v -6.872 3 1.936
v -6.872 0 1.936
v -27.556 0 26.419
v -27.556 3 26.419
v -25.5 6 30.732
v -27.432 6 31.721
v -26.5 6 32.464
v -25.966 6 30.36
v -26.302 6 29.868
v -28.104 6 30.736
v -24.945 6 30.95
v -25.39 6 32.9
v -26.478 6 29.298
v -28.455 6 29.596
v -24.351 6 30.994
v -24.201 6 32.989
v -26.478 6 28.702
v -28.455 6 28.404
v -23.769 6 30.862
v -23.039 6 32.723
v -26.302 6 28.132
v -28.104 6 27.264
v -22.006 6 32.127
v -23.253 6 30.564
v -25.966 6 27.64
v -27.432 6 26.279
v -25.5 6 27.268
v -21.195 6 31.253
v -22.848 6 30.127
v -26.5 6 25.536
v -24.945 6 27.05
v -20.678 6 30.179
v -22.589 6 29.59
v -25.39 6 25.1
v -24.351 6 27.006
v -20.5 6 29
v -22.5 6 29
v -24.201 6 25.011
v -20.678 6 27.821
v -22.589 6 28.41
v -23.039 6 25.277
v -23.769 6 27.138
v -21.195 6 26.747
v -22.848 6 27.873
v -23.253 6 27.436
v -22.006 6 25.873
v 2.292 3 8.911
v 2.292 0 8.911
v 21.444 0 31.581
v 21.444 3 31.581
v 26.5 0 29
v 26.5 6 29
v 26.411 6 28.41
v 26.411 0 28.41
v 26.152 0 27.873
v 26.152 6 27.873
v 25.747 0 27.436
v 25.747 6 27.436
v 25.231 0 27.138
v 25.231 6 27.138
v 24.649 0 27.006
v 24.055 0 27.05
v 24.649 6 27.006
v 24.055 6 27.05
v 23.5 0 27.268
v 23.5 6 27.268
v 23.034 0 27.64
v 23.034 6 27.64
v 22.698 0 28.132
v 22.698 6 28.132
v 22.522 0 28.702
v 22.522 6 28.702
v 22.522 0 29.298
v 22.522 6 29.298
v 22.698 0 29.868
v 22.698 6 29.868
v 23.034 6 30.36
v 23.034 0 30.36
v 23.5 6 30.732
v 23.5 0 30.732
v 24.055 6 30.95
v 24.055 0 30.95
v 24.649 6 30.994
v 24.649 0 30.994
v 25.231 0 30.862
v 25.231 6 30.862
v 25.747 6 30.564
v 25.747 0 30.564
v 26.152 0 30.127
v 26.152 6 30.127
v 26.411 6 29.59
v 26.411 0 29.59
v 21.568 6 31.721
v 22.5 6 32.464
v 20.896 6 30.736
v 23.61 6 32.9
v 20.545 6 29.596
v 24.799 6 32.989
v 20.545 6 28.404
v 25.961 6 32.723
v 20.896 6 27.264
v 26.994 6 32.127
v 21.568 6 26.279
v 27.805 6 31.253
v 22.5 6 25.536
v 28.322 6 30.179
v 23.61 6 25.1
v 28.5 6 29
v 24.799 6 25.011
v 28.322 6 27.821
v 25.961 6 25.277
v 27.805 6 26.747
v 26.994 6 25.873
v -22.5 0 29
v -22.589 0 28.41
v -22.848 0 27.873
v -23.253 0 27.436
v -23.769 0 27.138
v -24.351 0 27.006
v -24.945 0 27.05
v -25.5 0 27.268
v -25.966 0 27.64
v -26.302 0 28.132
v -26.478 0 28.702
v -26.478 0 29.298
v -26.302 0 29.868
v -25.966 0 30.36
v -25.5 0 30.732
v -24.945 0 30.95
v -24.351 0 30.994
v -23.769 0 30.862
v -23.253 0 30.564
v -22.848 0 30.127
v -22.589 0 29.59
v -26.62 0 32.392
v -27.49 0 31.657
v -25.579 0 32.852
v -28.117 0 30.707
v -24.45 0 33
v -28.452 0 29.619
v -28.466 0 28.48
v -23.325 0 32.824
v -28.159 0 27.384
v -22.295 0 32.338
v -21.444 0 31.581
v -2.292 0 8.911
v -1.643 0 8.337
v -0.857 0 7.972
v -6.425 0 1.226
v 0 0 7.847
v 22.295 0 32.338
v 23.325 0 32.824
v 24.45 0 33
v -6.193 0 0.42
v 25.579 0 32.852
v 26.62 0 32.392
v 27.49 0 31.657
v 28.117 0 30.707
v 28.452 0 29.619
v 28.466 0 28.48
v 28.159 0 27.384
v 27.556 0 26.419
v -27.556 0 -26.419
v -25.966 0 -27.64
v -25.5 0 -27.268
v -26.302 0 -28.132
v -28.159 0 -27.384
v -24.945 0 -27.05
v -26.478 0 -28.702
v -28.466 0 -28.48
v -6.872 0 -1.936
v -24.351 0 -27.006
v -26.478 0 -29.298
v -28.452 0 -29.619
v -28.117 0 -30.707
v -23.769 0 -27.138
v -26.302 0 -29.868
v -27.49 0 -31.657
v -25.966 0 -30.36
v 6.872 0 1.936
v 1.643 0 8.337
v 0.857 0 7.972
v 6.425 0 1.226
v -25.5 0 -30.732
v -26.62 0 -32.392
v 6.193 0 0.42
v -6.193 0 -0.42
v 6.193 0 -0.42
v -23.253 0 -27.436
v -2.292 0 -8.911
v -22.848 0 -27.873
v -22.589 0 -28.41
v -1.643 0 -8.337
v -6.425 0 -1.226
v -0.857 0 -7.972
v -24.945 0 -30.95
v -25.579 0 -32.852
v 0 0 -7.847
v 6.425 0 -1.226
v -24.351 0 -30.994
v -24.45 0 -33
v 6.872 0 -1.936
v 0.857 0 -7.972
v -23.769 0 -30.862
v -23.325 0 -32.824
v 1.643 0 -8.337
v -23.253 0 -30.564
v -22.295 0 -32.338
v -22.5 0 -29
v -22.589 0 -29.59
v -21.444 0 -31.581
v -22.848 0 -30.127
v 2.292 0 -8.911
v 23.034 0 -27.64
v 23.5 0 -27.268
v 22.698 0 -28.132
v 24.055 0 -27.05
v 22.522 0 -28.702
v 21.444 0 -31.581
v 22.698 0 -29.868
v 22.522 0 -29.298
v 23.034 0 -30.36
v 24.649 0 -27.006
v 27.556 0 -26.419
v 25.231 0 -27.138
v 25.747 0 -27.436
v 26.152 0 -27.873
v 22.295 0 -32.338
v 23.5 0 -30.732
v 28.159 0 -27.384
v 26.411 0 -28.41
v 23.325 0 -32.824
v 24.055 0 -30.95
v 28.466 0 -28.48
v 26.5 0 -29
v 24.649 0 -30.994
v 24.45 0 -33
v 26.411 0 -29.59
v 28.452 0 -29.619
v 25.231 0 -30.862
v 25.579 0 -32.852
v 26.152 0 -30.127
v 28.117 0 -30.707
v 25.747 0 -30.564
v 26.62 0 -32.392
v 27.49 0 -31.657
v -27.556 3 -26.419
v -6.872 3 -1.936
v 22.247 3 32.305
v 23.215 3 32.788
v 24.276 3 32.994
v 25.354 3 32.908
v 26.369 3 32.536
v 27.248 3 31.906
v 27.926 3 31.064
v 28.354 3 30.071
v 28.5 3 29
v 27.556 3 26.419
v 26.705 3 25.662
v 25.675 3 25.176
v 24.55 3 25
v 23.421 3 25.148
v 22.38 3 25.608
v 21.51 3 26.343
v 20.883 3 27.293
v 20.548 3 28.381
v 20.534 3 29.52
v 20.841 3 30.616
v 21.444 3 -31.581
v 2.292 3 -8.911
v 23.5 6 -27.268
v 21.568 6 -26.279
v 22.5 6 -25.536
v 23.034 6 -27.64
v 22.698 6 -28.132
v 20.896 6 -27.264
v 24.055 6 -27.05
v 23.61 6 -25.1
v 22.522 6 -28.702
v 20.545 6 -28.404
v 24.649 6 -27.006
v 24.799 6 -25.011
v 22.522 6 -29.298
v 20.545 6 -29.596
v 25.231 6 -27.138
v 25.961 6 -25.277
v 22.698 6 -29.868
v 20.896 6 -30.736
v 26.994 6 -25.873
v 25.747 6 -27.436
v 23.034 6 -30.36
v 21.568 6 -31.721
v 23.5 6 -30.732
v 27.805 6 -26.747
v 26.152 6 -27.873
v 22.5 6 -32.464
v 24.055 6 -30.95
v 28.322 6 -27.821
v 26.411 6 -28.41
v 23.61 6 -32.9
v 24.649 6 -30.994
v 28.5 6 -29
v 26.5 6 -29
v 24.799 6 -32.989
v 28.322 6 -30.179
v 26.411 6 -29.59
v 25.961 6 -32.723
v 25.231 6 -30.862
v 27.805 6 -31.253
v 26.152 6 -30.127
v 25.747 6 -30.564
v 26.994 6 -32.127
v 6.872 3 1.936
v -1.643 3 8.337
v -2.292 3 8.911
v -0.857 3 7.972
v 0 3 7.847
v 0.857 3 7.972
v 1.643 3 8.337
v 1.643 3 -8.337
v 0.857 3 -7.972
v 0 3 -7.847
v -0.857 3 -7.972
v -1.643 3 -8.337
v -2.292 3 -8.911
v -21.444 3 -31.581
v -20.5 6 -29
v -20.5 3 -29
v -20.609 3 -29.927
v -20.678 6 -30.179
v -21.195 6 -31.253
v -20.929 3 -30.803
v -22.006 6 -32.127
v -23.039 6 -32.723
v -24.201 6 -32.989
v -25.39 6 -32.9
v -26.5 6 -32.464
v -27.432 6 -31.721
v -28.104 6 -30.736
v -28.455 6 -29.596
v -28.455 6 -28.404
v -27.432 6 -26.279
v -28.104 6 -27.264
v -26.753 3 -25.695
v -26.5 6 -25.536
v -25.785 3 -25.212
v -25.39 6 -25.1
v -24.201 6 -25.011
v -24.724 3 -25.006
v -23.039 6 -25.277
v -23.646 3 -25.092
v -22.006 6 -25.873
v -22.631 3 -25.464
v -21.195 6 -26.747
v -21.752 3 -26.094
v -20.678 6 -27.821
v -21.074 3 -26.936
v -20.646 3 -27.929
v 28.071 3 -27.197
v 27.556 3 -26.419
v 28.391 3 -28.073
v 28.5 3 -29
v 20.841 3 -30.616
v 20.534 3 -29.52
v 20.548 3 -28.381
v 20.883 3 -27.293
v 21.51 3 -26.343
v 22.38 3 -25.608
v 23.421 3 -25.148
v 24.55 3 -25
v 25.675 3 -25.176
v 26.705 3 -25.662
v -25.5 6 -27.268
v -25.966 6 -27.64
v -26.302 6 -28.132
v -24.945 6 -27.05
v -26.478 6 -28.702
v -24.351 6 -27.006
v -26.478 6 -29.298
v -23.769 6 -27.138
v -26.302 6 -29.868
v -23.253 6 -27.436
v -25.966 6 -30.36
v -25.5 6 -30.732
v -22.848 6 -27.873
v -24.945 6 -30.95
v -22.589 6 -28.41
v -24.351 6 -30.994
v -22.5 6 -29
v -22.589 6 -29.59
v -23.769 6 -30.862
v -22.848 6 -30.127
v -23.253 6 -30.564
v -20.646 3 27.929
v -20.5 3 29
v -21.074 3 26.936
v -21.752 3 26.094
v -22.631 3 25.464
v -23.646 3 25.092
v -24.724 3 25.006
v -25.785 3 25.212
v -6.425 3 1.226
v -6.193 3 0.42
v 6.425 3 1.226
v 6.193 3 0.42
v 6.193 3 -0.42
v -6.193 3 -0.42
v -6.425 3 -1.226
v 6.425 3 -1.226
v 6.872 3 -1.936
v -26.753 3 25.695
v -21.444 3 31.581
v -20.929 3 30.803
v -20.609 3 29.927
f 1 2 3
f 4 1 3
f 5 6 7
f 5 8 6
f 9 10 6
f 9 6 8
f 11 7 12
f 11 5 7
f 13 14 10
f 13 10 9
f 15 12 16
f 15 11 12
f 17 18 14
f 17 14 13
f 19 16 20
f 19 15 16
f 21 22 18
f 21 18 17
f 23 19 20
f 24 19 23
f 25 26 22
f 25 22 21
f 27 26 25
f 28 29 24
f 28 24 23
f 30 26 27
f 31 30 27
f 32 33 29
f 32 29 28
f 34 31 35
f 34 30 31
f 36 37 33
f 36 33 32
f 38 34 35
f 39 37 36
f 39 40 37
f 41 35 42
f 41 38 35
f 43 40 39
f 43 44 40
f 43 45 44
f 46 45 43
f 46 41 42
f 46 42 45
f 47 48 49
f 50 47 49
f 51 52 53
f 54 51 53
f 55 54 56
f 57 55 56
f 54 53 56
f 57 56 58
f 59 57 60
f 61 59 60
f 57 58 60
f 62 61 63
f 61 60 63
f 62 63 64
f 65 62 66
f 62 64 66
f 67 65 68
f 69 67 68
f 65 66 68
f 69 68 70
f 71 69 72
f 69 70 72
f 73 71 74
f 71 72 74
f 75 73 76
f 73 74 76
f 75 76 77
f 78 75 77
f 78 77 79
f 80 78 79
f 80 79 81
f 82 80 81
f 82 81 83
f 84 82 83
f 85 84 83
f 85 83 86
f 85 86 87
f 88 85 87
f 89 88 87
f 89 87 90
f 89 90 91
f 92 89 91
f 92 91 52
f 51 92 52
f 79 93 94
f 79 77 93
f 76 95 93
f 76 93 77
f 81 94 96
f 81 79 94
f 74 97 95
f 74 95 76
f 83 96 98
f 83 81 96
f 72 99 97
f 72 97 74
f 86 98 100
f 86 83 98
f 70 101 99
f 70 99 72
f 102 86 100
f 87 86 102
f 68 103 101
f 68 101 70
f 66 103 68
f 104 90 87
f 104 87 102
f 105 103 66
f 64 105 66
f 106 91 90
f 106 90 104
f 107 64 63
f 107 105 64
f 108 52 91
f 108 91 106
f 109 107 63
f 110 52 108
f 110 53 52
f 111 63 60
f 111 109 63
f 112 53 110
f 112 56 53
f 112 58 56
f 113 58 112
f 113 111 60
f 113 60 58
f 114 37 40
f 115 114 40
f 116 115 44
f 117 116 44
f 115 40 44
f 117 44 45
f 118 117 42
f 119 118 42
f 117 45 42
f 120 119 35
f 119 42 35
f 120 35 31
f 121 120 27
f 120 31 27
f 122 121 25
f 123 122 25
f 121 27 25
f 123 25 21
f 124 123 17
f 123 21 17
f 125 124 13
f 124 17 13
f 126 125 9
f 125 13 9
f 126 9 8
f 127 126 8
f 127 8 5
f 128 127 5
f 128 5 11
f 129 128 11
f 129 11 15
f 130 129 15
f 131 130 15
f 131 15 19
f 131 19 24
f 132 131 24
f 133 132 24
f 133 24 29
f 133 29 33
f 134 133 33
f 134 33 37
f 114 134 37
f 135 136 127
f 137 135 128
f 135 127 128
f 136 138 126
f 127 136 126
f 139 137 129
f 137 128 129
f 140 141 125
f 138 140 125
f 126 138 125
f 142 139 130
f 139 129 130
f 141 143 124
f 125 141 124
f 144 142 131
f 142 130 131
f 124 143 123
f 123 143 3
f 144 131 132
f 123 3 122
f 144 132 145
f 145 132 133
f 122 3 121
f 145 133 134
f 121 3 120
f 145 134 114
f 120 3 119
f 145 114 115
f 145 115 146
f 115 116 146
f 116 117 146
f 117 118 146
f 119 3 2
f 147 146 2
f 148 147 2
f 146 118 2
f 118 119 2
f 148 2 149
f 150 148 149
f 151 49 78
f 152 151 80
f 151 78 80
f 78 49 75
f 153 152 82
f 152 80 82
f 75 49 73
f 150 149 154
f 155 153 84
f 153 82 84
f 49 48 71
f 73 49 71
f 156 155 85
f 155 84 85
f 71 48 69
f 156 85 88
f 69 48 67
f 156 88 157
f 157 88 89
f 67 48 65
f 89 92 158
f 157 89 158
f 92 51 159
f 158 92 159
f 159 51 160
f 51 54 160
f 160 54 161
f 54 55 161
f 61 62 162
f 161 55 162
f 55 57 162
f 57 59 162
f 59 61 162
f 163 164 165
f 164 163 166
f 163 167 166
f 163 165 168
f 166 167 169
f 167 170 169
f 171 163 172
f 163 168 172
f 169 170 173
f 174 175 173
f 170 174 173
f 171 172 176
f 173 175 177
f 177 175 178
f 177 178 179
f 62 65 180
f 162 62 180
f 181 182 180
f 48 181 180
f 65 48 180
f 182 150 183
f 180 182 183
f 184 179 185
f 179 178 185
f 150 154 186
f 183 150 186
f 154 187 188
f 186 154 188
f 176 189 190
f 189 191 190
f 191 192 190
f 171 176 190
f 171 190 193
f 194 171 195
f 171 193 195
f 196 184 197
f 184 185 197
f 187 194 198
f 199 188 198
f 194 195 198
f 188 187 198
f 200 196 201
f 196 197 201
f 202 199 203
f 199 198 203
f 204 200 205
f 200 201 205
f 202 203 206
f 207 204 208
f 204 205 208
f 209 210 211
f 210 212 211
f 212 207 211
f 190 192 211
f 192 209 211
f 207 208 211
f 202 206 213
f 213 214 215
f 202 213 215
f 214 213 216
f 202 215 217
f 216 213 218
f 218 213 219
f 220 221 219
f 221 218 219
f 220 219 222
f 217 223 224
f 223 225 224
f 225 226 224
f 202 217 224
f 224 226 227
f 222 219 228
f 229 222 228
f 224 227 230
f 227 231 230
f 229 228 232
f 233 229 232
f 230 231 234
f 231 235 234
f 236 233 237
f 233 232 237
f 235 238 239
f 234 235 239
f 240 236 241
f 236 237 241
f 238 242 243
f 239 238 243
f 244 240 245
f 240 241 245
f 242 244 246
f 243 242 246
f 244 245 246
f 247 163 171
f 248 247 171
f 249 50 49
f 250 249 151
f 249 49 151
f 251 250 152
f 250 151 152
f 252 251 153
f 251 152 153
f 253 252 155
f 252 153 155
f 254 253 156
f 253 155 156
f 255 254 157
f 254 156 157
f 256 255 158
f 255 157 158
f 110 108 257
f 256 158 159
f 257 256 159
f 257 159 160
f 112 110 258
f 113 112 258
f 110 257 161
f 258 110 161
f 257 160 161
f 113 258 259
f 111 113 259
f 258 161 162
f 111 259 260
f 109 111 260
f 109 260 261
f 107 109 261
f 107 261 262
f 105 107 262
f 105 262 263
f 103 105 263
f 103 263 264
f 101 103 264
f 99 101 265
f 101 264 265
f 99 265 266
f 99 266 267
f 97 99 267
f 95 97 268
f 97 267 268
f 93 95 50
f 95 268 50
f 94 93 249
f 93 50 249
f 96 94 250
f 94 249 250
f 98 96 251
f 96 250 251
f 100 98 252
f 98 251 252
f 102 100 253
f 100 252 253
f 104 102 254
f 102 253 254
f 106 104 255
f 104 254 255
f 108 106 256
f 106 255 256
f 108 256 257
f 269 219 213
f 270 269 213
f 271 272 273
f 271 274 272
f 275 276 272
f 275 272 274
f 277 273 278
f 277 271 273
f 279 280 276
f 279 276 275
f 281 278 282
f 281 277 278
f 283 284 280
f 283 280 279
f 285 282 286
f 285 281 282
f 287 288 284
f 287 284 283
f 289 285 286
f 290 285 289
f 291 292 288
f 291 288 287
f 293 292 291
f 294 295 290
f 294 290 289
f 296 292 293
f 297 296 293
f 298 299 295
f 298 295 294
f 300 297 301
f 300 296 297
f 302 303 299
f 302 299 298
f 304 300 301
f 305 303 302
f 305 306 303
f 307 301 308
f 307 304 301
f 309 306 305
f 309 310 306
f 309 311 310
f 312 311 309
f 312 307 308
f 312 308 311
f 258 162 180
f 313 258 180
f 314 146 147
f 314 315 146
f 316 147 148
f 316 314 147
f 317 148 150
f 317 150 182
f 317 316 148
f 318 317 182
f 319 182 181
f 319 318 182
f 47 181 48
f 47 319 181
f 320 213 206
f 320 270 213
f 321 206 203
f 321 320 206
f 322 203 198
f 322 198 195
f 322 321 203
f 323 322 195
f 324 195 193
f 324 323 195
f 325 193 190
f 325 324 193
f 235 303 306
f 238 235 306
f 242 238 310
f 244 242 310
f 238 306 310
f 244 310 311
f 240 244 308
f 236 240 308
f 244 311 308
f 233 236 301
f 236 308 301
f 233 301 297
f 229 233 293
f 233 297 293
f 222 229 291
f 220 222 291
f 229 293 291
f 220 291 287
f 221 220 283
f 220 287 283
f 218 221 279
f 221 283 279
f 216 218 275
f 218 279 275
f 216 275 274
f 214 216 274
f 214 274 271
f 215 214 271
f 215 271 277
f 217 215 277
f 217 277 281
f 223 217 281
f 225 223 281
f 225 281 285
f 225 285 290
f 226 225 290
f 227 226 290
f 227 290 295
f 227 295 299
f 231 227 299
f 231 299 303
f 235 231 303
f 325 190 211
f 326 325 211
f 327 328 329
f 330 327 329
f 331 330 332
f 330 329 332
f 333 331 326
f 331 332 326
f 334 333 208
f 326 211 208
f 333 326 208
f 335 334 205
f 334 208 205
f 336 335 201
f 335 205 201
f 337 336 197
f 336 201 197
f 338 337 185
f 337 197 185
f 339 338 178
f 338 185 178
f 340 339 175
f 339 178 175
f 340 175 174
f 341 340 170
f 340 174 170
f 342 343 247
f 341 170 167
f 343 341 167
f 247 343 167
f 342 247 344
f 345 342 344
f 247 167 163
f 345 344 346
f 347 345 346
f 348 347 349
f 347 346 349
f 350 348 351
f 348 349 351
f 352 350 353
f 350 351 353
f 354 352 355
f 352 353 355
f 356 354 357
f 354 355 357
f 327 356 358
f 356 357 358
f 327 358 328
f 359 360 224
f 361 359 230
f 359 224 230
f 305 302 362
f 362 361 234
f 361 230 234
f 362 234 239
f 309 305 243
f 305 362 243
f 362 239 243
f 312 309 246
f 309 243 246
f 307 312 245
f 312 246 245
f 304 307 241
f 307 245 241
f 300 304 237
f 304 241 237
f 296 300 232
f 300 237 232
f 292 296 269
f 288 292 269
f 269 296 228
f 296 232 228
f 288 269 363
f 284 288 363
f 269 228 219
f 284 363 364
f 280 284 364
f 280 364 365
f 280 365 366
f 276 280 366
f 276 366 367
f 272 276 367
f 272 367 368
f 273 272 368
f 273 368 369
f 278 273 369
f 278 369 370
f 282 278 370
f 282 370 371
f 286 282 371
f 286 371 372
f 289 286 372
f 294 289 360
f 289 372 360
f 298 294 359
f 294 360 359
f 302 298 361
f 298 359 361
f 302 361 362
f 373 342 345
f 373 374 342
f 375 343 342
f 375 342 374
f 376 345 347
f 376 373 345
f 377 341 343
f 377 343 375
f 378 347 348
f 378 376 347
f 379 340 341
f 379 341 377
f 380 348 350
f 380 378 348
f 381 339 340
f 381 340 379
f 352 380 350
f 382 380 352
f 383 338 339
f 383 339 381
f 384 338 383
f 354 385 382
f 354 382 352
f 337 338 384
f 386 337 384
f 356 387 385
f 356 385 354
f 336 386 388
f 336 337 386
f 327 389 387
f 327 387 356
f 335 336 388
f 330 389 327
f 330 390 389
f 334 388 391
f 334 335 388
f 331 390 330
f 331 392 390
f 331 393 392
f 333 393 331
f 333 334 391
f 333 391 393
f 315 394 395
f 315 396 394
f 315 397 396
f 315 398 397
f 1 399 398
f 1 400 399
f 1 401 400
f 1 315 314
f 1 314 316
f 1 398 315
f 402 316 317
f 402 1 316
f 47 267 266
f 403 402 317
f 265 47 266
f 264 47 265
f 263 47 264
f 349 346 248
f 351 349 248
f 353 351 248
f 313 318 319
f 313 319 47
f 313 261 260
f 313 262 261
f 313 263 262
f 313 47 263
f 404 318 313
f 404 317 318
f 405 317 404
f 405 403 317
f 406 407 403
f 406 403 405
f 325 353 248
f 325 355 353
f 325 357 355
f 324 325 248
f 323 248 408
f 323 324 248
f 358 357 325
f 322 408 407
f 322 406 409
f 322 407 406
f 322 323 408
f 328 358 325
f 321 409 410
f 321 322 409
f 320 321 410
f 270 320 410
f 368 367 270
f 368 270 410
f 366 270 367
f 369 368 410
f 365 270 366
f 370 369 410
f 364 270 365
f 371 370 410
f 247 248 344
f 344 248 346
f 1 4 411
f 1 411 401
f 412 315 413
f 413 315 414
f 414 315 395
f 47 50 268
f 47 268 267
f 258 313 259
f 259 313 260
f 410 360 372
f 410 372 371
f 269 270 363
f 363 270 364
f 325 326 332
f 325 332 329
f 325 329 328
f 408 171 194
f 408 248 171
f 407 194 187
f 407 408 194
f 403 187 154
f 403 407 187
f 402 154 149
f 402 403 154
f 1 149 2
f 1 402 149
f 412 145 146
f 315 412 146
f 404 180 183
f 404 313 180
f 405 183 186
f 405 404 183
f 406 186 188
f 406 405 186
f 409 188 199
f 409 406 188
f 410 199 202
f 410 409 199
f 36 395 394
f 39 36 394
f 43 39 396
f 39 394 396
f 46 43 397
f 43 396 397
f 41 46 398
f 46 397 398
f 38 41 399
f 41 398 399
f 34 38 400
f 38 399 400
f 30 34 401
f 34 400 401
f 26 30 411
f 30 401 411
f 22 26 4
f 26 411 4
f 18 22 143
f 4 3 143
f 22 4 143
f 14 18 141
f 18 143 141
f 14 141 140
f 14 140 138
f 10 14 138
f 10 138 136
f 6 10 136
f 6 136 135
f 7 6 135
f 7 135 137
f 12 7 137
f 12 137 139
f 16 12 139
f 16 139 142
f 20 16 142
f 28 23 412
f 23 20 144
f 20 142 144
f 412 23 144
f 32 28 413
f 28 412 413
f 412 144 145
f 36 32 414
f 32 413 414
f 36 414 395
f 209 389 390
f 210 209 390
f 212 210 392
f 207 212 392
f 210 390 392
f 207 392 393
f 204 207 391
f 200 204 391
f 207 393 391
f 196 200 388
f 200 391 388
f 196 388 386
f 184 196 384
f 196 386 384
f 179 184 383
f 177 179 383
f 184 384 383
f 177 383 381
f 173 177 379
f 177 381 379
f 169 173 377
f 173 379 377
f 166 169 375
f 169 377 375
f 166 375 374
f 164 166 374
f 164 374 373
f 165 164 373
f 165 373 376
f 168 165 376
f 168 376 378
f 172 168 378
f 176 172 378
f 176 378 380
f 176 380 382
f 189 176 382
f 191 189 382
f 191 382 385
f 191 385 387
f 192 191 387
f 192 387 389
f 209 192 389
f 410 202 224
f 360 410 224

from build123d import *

# Parameters (mm, degrees)
BOSS_EXTRUDE3_DEPTH = 3
FILLET2_R           = 3
SKETCH6_R           = 4
BOSS_EXTRUDE4_DEPTH = 3
SKETCH7_R           = 2
CUT_EXTRUDE4_DEPTH  = 7


with BuildPart() as part:
    # Sketch5 → Boss-Extrude3 (new body)
    with BuildSketch(Plane(origin=(0, 0, 0), x_dir=(1, 0, 0), z_dir=(0, 1, 0))):
        with BuildLine():
            Line((-27.555542502, 26.418593403), (-5.236386006, 0))
            Line((-5.236386006, 0), (0, 6.198171191))
            Line((0, 6.198171191), (-21.444457498, 31.581406597))
            ThreePointArc((-21.444457498, 31.581406597), (-27.081406597, 32.055542502), (-27.555542502, 26.418593403))
        make_face()
        with BuildLine():
            Line((5.236386006, 0), (0, -6.198171191))
            Line((0, -6.198171191), (21.444457498, -31.581406597))
            ThreePointArc((21.444457498, -31.581406597), (27.081406597, -32.055542502), (27.555542502, -26.418593403))
            Line((27.555542502, -26.418593403), (5.236386006, 0))
        make_face()
        with BuildLine():
            Line((21.444457498, 31.581406597), (0, 6.198171191))
            Line((0, 6.198171191), (5.236386006, 0))
            Line((5.236386006, 0), (27.555542502, 26.418593403))
            ThreePointArc((27.555542502, 26.418593403), (27.081406597, 32.055542502), (21.444457498, 31.581406597))
        make_face()
        with BuildLine():
            Line((-5.236386006, 0), (-27.555542502, -26.418593403))
            ThreePointArc((-27.555542502, -26.418593403), (-27.081406597, -32.055542502), (-21.444457498, -31.581406597))
            Line((-21.444457498, -31.581406597), (0, -6.198171191))
            Line((0, -6.198171191), (-5.236386006, 0))
        make_face()
        Polygon((0, 6.198171191), (-5.236386006, 0), (0, -6.198171191), (5.236386006, 0), align=None)
    extrude(amount=BOSS_EXTRUDE3_DEPTH)

    # Fillet2
    fillet2_edges = [part.edges().sort_by_distance(p)[0] for p in [
        (0, 1.5, -6.198171191),
        (5.236386006, 1.5, 0),
        (0, 1.5, 6.198171191),
        (-5.236386006, 1.5, 0),
    ]]
    fillet(fillet2_edges, radius=FILLET2_R)

    # Sketch6 → Boss-Extrude4 (add)
    with BuildSketch(Plane(origin=(0, 3, 0), x_dir=(1, 0, 0), z_dir=(0, 1, 0))):
        with Locations((-24.5, 29)):
            Circle(SKETCH6_R)
        with Locations((24.5, 29)):
            Circle(SKETCH6_R)
        with Locations((-24.5, -29)):
            Circle(SKETCH6_R)
        with Locations((24.5, -29)):
            Circle(SKETCH6_R)
    extrude(amount=BOSS_EXTRUDE4_DEPTH)

    # Sketch7 → Cut-Extrude4 (cut, through all)
    with BuildSketch(Plane(origin=(0, 6, 0), x_dir=(1, 0, 0), z_dir=(0, 1, 0))):
        with Locations((-24.5, -29)):
            Circle(SKETCH7_R)
        with Locations((-24.5, 29)):
            Circle(SKETCH7_R)
        with Locations((24.5, 29)):
            Circle(SKETCH7_R)
        with Locations((24.5, -29)):
            Circle(SKETCH7_R)
    extrude(amount=-CUT_EXTRUDE4_DEPTH, mode=Mode.SUBTRACT)


solid = part.part
